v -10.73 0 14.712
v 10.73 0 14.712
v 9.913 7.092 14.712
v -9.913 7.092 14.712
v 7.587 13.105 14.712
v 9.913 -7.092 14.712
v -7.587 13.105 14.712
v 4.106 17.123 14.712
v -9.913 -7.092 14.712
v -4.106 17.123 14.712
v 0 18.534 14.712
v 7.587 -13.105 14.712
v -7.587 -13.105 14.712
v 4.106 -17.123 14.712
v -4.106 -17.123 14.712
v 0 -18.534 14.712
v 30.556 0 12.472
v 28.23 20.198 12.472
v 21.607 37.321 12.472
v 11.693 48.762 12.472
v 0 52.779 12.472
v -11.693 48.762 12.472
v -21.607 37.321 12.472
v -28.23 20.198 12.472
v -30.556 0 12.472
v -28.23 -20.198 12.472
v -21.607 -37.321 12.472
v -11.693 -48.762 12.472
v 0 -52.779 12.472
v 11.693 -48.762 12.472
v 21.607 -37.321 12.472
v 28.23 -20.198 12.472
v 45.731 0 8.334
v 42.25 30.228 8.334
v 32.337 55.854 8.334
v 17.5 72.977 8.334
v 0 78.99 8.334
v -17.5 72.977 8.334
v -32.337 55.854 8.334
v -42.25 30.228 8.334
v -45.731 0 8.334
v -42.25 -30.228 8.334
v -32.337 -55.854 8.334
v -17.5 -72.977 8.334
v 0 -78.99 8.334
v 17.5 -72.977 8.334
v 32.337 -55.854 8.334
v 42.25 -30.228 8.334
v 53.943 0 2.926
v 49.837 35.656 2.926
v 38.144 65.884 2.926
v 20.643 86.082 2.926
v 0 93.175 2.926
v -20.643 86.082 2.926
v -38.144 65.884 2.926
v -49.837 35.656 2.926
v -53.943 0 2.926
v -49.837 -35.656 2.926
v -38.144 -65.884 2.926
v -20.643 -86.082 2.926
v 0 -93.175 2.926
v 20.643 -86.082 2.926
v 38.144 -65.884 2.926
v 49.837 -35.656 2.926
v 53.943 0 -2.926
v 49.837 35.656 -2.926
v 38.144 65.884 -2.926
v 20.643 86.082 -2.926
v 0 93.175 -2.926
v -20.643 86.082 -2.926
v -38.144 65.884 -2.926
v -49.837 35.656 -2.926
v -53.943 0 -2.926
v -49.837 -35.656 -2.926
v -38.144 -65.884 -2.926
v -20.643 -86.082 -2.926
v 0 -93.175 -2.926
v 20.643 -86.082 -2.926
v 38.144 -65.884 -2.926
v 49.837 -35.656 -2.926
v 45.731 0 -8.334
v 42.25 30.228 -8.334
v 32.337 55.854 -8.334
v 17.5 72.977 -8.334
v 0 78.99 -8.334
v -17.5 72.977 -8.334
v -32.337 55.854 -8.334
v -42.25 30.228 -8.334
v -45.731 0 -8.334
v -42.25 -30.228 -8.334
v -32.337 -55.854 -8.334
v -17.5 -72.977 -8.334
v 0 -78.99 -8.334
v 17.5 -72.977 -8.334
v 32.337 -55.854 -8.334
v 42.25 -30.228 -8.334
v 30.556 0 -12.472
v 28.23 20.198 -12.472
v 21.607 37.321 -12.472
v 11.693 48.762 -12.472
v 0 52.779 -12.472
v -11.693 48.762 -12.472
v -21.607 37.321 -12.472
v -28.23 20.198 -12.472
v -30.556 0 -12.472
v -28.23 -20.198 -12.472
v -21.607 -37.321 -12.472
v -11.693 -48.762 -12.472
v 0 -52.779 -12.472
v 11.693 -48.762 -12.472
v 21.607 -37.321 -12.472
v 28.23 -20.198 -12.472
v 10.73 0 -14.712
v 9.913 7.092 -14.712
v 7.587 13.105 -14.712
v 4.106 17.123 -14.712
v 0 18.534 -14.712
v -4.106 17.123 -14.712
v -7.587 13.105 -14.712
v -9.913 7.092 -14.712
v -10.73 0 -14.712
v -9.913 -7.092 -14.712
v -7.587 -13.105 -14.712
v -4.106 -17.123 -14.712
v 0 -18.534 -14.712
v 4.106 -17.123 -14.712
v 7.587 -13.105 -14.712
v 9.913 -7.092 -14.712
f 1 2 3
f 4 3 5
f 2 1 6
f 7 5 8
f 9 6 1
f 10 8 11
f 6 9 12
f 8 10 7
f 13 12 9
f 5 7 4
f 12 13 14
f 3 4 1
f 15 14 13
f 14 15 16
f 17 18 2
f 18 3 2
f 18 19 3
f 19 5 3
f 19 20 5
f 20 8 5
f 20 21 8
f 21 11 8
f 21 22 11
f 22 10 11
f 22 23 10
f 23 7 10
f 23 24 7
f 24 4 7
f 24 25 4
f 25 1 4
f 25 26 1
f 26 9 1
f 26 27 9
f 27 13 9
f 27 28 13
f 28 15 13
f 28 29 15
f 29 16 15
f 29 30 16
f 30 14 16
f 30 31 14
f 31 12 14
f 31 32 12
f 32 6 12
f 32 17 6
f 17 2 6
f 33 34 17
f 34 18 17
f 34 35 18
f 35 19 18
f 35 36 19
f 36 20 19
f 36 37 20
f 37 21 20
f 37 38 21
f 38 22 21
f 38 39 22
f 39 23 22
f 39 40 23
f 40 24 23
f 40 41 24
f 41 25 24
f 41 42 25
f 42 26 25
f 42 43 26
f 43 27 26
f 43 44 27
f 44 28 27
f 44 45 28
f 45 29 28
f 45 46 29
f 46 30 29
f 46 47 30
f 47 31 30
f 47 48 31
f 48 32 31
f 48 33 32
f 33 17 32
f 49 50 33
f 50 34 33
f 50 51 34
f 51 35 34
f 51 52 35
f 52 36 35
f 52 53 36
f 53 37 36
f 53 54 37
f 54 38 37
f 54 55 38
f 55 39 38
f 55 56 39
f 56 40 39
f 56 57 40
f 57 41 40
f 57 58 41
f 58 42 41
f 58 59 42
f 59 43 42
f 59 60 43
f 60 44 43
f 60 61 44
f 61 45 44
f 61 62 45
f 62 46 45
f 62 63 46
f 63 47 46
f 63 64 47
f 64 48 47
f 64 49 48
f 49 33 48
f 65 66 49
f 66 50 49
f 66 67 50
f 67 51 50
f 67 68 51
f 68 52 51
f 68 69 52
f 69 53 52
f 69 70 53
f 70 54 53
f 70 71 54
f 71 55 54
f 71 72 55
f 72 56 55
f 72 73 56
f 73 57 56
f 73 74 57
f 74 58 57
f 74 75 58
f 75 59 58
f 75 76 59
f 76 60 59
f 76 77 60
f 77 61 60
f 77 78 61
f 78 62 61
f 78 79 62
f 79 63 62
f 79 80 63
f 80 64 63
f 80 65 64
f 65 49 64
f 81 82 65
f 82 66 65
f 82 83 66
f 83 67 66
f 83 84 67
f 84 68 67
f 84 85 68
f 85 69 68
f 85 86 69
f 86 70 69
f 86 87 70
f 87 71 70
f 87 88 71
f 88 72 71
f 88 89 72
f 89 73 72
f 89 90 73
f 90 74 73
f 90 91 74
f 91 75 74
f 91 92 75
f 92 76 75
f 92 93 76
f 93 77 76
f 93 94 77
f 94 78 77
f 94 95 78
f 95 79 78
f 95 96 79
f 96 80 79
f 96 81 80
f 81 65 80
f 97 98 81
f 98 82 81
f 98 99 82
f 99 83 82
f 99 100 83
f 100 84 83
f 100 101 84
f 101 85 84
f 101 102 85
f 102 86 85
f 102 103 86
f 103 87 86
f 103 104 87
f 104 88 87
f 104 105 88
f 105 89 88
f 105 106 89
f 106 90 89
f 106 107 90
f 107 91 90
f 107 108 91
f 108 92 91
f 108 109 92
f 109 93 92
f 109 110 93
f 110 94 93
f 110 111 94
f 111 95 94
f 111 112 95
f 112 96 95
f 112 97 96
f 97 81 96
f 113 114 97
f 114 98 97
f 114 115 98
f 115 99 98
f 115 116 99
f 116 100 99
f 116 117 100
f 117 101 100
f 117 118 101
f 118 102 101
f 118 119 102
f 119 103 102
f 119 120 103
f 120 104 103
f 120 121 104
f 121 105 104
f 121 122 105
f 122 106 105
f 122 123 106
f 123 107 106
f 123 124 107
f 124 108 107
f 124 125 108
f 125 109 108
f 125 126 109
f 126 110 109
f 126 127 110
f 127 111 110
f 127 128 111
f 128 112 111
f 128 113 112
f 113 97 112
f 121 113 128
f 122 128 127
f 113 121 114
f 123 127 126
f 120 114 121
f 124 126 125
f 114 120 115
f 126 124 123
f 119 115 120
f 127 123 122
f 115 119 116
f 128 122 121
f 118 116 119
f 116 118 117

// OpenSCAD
// Generated by SolidPython 1.0.1 on 2020-07-29 00:46:50


scale(v = [11, 19, 3]) {
	sphere(r = 5);
}
/***********************************************
*********      SolidPython code:      **********
************************************************
 
# import packages: SolidPython
from solid import *
from solid.utils import *
from itertools import chain, combinations, permutations


class Resize:

    def __init__(self, scad_file):
        self.scad_file = scad_file
        #self.scad_file = import_scad(scad_file)
        # cone/cylinder param:
        self.r1 = 0
        self.r2 = 0
        self.h = 0
        # rectangular prism param:
        self.w = 0
        self.l = 0
        # ellipse param:
        self.r = 0

    # import OpenScad code (file name corresponds to shape)


    # classify shape + parameters
    def assign(self, param1, param2, param3):
        if self.scad_file == 'cone.scad':
            self.r1 = param1
            self.r2 = param2
            self.h = param3
        elif self.scad_file == 'cylinder.scad':
            self.r1 = param1
            self.r2 = param2
            self.h = param3
        elif self.scad_file == 'rectangularPrism.scad':
            self.h = param1
            self.l = param2
            self.w = param3
        else:
            self.r = param1
            self.h = param2

    # resize parameters
    def iterate(self):
        x = range(3, 20, 2)
        i = 1
        if self.scad_file == 'cone.scad':
            tempList = list(permutations(x, 2))
            for temp in tempList:
                param1 = temp[0]
                param2 = temp[1]
                filepath = 'produced_scad_files/' + 'cone' + str(param1) + '_' + str(param2) + '_' + '.scad'
                scad_render_to_file(cylinder(h=param1, r1=param2, r2=0), filepath)

        elif self.scad_file == 'cylinder.scad':
            tempList = list(permutations(x, 3))
            for temp in tempList:
                param1 = temp[0]
                param2 = temp[1]
                filepath = 'produced_scad_files/' + 'cylinder' + str(param1) + '_' + str(param2) + '_' + '.scad'
                scad_render_to_file(cylinder(h=param1, r1=param2, r2=param2), filepath)

        elif self.scad_file == 'rectangularPrism.scad':
            tempList = list(permutations(x, 3))
            for temp in tempList:
                param1 = temp[0]
                param2 = temp[1]
                param3 = temp[2]
                filepath = 'produced_scad_files/' + 'rectangularPrism' + str(param1) + '_' + str(param2) + '_' + str(
                    param3) + '.scad'
                scad_render_to_file(cube(size=(param1, param2, param3)), filepath)

        elif self.scad_file == 'ellipse.scad':
            tempList = list(permutations(x, 4))
            for temp in tempList:
                param1 = temp[0]
                param2 = temp[1]
                param3 = temp[2]
                param4 = temp[3]
                filepath = 'produced_scad_files/' + 'ellipse' + str(param1) + '_' + str(param2) + '_' + str(param3) + '_' + str(param4) + '.scad'
                scad_render_to_file(scale([param1, param2, param3])(sphere(r=param4)), filepath)

    def render_to_scadfile(self):
        scad_render_to_file(scad, 'example.scad') 
 
************************************************/
